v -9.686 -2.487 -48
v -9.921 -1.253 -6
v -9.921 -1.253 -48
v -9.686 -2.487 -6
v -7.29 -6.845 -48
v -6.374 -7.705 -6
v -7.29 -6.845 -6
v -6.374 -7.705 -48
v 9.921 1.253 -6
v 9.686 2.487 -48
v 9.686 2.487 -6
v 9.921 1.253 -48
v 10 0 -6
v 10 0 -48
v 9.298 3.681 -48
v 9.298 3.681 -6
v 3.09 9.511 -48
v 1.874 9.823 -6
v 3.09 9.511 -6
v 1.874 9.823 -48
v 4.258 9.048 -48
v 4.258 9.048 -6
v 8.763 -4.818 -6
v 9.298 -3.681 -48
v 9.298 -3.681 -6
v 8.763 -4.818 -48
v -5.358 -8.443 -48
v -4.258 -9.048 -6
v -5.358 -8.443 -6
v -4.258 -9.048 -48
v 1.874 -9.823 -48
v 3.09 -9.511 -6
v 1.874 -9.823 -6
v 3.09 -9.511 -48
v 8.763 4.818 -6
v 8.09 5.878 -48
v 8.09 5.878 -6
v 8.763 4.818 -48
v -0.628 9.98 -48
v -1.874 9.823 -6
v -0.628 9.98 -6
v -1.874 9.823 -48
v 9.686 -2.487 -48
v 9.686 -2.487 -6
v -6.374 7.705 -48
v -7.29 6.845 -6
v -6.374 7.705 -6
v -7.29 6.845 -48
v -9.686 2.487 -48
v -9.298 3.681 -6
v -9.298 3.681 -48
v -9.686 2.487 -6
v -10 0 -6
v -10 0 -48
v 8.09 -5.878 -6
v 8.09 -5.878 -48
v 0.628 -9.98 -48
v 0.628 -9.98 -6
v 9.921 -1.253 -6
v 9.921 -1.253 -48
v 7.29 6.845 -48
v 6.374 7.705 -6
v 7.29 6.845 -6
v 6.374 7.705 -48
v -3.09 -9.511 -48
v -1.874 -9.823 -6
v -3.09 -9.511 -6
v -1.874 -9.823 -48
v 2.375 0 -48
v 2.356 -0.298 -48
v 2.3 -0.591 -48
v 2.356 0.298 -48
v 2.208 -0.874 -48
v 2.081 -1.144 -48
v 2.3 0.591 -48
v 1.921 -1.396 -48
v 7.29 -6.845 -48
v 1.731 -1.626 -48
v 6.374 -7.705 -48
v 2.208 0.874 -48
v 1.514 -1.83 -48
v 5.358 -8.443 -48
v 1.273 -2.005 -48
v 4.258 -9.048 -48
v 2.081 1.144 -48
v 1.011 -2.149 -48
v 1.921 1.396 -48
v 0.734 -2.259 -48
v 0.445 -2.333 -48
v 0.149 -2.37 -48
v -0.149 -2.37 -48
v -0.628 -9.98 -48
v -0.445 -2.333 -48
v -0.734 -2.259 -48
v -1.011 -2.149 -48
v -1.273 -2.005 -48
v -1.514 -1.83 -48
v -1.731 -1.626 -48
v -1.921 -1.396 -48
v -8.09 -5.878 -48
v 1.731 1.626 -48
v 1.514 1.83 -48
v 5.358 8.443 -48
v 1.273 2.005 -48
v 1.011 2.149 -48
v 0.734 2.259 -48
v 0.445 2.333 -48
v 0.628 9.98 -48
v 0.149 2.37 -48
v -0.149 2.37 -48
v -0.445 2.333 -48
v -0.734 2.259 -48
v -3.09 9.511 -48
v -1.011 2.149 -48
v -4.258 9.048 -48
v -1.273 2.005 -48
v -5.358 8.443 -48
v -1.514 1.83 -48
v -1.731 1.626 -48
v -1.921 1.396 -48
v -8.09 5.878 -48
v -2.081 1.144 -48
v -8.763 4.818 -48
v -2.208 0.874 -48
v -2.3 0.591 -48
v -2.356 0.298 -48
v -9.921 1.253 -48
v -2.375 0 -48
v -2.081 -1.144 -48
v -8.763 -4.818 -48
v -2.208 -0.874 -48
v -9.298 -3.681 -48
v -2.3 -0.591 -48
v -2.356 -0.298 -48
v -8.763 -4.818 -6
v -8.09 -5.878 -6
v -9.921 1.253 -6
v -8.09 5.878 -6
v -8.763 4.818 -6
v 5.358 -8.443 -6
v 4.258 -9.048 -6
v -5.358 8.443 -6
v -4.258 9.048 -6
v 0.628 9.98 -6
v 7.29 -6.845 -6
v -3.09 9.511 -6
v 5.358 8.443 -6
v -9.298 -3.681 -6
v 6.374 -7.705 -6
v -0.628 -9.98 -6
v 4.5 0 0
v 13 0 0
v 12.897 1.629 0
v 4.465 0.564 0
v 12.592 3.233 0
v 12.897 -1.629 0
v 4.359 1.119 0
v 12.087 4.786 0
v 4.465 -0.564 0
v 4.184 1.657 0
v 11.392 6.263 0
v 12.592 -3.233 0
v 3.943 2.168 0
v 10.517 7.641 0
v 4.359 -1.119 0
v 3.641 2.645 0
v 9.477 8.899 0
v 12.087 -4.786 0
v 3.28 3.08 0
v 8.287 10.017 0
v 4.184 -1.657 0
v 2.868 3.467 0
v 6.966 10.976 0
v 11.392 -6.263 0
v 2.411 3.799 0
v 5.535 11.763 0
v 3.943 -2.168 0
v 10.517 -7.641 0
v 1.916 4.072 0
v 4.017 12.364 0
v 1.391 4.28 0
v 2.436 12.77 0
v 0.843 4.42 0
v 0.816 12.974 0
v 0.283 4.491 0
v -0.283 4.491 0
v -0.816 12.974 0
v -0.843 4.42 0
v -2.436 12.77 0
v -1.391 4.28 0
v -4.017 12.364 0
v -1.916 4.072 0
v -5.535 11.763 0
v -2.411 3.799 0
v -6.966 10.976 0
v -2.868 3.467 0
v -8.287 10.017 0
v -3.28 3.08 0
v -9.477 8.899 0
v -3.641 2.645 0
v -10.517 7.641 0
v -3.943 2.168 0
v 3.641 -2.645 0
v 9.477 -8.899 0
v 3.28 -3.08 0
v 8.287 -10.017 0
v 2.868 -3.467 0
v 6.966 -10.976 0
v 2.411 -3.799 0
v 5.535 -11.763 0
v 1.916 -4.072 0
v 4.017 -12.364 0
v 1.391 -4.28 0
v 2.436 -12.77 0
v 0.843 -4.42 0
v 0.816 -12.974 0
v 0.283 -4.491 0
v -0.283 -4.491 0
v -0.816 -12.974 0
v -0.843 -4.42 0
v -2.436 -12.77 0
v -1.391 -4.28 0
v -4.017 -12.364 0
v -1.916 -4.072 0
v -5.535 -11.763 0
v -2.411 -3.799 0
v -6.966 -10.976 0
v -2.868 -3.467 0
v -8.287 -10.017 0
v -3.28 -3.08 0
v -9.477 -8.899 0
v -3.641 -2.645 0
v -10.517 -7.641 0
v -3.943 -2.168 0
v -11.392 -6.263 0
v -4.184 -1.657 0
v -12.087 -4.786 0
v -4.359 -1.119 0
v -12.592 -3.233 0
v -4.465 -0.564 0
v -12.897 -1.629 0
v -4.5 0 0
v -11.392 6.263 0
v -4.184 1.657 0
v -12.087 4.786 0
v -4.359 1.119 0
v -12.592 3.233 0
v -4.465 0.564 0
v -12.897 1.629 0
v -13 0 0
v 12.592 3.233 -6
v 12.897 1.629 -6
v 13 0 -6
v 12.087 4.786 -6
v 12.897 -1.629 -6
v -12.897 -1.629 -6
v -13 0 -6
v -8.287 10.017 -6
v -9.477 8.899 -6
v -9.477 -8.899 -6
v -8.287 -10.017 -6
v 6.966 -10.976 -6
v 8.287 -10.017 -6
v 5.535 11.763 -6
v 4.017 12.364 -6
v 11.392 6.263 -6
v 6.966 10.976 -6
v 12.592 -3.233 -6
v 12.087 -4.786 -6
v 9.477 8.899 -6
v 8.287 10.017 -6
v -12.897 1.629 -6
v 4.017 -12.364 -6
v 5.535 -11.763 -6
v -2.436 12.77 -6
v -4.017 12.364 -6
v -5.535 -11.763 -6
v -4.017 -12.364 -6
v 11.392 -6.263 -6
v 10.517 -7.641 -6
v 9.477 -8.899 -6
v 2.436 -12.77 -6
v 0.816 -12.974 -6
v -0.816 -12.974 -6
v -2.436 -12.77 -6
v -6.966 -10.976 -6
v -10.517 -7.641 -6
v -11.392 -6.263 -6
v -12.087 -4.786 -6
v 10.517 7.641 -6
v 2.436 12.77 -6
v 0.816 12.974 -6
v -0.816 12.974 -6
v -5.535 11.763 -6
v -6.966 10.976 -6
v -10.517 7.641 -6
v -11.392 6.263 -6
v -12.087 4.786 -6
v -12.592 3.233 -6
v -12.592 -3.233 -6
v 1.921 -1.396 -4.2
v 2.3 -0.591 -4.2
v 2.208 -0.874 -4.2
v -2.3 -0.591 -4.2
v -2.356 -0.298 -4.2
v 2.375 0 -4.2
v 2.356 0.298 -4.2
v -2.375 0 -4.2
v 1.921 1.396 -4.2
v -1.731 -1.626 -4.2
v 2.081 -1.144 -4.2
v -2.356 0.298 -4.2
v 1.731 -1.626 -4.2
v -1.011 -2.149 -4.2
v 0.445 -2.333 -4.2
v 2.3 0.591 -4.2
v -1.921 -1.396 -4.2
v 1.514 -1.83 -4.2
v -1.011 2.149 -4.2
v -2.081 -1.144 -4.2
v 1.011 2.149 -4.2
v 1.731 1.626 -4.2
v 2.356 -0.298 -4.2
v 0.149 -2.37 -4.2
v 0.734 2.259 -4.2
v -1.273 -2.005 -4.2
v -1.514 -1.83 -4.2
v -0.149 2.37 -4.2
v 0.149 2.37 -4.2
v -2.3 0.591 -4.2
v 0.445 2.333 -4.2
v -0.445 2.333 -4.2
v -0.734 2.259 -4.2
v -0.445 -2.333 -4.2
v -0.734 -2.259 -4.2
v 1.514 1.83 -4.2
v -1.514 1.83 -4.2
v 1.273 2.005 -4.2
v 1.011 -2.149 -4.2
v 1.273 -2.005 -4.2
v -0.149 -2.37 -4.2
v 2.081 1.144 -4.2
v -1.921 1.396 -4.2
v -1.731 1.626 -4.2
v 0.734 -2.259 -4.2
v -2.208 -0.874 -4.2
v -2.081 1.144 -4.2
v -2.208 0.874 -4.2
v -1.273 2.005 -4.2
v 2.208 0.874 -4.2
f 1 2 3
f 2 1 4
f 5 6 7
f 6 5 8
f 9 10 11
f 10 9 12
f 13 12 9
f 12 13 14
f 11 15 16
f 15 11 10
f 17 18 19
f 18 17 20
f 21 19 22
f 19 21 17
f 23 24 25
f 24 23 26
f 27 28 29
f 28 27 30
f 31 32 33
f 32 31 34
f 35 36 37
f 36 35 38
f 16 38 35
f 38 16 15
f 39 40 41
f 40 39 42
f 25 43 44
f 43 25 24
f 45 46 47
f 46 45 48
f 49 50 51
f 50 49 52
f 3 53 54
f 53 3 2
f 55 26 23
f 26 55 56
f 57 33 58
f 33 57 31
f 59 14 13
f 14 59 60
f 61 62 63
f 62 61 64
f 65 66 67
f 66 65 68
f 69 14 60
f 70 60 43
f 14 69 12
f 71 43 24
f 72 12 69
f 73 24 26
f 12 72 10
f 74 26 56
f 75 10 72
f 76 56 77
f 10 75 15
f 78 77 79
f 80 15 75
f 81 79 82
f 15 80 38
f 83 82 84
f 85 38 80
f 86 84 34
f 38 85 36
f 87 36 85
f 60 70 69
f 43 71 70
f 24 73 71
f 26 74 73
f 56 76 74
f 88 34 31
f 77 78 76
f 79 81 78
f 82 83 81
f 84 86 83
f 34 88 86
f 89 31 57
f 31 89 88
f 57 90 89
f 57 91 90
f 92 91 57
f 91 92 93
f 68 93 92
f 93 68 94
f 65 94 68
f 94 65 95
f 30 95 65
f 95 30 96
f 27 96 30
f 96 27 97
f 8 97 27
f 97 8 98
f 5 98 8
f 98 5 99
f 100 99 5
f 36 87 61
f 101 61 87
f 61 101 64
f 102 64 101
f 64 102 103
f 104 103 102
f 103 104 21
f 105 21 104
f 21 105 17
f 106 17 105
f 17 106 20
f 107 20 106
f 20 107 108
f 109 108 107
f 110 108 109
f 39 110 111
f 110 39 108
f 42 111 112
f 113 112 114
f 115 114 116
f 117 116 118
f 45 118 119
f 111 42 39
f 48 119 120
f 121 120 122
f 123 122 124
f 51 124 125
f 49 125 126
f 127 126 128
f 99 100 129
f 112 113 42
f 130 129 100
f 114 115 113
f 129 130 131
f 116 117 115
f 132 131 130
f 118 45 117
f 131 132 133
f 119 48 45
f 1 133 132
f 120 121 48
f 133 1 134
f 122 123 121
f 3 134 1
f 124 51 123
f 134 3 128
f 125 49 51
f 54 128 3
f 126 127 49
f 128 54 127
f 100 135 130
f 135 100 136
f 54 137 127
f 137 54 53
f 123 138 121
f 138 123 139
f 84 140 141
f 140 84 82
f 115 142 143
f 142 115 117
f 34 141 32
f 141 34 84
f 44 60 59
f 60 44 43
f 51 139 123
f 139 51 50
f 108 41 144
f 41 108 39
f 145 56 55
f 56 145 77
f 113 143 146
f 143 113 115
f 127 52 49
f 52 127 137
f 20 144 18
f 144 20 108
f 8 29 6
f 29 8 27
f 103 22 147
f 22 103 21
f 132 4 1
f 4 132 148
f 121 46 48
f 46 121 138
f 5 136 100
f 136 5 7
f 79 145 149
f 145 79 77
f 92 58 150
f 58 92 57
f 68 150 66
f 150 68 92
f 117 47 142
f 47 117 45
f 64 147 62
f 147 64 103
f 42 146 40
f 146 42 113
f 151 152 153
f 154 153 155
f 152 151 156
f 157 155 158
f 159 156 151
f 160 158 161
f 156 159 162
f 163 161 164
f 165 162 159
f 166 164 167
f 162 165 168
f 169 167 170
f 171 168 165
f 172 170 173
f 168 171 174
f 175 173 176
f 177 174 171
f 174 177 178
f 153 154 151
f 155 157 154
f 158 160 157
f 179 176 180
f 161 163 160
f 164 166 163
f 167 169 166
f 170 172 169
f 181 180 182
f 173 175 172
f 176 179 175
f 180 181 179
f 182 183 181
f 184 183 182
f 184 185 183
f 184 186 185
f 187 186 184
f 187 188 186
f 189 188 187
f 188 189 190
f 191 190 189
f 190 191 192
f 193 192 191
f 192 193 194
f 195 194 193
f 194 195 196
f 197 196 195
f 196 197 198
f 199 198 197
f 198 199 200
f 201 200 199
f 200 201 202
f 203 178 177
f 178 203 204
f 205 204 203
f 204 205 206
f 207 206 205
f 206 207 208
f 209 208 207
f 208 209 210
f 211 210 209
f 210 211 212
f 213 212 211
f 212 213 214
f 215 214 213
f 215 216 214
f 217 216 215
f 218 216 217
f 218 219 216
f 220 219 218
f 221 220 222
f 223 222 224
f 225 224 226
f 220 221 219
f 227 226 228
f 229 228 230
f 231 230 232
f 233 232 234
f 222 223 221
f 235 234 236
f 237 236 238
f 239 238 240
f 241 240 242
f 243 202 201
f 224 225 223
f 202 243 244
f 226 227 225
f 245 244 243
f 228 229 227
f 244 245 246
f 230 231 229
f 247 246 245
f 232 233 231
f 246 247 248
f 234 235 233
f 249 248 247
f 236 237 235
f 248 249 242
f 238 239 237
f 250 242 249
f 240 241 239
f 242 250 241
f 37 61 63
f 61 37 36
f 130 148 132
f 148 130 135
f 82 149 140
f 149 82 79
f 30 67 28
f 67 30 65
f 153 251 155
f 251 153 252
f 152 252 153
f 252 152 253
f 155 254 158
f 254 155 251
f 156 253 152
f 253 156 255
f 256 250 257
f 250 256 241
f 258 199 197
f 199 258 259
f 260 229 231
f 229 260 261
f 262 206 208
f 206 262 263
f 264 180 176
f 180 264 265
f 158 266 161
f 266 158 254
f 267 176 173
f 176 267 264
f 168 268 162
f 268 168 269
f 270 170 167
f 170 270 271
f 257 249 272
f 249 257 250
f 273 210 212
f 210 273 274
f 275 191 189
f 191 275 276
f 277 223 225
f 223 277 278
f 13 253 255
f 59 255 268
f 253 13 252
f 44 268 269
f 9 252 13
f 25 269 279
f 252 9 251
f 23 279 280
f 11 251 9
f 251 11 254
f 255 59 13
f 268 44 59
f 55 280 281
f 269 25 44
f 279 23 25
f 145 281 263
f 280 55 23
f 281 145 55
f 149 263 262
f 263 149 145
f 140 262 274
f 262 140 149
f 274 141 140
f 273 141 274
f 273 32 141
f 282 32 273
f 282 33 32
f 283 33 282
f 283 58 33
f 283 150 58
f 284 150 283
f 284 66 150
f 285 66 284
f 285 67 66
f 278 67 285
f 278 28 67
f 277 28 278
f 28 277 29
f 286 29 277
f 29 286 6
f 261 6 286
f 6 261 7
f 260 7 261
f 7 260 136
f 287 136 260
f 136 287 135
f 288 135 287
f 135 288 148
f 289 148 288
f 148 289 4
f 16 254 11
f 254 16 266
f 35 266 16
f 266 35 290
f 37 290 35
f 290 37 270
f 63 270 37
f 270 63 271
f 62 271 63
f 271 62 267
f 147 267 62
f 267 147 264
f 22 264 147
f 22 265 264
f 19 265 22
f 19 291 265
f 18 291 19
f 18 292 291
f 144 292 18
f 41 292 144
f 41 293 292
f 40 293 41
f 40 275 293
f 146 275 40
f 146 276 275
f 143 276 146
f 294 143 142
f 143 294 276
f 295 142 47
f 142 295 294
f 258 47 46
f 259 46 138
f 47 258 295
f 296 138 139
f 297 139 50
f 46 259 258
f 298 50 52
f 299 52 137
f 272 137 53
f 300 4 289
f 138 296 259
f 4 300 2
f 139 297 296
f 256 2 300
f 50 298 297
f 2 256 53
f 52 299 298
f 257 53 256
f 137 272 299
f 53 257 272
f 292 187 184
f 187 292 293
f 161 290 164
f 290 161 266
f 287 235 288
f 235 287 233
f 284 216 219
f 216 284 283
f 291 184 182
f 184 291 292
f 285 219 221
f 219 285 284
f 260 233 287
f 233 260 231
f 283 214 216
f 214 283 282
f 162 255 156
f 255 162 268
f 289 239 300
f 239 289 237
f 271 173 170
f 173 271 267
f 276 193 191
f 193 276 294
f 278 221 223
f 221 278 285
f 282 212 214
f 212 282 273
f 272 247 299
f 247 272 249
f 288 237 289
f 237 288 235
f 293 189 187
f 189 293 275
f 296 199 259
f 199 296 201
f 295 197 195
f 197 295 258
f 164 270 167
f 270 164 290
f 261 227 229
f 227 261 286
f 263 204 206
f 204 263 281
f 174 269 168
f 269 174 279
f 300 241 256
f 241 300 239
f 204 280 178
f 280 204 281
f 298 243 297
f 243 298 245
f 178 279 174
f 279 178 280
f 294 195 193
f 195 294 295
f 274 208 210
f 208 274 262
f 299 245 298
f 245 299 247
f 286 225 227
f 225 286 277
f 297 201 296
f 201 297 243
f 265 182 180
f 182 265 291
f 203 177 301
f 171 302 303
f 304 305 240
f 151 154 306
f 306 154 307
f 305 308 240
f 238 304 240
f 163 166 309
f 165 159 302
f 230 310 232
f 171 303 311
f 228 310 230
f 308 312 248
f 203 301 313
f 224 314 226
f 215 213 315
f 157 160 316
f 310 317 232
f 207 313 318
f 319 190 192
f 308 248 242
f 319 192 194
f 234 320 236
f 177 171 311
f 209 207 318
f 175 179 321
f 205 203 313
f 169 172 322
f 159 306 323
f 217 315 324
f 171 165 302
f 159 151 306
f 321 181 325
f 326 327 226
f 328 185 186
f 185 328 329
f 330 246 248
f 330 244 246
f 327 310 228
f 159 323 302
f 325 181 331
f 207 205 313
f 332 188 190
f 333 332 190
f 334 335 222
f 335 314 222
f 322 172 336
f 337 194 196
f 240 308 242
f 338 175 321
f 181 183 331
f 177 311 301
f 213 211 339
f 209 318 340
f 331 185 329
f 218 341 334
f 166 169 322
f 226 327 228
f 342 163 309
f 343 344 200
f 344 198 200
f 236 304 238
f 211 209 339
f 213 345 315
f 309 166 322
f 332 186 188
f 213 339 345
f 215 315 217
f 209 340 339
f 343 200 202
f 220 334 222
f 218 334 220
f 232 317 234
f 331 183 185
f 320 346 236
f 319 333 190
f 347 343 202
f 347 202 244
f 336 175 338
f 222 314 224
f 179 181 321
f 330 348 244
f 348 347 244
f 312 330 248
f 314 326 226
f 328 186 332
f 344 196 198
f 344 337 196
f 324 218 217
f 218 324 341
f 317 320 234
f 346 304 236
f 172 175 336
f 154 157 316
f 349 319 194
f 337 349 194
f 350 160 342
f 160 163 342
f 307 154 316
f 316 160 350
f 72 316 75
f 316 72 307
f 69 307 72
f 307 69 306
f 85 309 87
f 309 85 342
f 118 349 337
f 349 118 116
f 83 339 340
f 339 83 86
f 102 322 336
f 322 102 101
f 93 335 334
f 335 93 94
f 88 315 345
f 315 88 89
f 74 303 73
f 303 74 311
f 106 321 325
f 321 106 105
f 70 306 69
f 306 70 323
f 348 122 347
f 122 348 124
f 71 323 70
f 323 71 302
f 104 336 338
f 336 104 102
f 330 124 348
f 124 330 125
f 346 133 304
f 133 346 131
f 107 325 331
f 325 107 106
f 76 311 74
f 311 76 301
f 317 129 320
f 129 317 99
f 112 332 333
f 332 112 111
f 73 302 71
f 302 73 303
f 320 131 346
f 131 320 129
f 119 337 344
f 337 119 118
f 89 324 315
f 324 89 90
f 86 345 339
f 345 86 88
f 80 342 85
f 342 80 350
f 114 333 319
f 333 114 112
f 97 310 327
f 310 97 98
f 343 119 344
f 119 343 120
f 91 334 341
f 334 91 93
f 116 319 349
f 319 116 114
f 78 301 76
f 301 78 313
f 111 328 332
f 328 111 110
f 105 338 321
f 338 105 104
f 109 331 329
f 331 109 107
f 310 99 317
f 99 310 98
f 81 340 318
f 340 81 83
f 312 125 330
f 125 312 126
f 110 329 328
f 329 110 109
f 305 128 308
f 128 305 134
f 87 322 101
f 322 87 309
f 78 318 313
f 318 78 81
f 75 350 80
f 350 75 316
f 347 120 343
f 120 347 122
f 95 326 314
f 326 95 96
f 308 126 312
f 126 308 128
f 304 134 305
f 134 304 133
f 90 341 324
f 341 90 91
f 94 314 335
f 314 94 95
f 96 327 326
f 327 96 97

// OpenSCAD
$fn = 50;


difference() {
	union() {
		translate(v = [0, 0, -48.0000000000]) {
			cylinder(h = 48, r = 10.0000000000);
		}
		translate(v = [0, 0, -6.0000000000]) {
			cylinder(h = 6, r = 13.0000000000);
		}
	}
	union() {
		translate(v = [0, 0, 0]) {
			rotate(a = [0, 0, 0]) {
				difference() {
					union() {
						#translate(v = [0, 0, -48.0000000000]) {
							cylinder(h = 48, r = 2.2500000000);
						}
						#translate(v = [0, 0, -4.2000000000]) {
							cylinder(h = 4.2000000000, r1 = 2.3750000000, r2 = 4.5000000000);
						}
						#translate(v = [0, 0, -48.0000000000]) {
							cylinder(h = 48, r = 2.3750000000);
						}
						#translate(v = [0, 0, -48.0000000000]) {
							cylinder(h = 48, r = 2.2500000000);
						}
					}
					union();
				}
			}
		}
	}
}
